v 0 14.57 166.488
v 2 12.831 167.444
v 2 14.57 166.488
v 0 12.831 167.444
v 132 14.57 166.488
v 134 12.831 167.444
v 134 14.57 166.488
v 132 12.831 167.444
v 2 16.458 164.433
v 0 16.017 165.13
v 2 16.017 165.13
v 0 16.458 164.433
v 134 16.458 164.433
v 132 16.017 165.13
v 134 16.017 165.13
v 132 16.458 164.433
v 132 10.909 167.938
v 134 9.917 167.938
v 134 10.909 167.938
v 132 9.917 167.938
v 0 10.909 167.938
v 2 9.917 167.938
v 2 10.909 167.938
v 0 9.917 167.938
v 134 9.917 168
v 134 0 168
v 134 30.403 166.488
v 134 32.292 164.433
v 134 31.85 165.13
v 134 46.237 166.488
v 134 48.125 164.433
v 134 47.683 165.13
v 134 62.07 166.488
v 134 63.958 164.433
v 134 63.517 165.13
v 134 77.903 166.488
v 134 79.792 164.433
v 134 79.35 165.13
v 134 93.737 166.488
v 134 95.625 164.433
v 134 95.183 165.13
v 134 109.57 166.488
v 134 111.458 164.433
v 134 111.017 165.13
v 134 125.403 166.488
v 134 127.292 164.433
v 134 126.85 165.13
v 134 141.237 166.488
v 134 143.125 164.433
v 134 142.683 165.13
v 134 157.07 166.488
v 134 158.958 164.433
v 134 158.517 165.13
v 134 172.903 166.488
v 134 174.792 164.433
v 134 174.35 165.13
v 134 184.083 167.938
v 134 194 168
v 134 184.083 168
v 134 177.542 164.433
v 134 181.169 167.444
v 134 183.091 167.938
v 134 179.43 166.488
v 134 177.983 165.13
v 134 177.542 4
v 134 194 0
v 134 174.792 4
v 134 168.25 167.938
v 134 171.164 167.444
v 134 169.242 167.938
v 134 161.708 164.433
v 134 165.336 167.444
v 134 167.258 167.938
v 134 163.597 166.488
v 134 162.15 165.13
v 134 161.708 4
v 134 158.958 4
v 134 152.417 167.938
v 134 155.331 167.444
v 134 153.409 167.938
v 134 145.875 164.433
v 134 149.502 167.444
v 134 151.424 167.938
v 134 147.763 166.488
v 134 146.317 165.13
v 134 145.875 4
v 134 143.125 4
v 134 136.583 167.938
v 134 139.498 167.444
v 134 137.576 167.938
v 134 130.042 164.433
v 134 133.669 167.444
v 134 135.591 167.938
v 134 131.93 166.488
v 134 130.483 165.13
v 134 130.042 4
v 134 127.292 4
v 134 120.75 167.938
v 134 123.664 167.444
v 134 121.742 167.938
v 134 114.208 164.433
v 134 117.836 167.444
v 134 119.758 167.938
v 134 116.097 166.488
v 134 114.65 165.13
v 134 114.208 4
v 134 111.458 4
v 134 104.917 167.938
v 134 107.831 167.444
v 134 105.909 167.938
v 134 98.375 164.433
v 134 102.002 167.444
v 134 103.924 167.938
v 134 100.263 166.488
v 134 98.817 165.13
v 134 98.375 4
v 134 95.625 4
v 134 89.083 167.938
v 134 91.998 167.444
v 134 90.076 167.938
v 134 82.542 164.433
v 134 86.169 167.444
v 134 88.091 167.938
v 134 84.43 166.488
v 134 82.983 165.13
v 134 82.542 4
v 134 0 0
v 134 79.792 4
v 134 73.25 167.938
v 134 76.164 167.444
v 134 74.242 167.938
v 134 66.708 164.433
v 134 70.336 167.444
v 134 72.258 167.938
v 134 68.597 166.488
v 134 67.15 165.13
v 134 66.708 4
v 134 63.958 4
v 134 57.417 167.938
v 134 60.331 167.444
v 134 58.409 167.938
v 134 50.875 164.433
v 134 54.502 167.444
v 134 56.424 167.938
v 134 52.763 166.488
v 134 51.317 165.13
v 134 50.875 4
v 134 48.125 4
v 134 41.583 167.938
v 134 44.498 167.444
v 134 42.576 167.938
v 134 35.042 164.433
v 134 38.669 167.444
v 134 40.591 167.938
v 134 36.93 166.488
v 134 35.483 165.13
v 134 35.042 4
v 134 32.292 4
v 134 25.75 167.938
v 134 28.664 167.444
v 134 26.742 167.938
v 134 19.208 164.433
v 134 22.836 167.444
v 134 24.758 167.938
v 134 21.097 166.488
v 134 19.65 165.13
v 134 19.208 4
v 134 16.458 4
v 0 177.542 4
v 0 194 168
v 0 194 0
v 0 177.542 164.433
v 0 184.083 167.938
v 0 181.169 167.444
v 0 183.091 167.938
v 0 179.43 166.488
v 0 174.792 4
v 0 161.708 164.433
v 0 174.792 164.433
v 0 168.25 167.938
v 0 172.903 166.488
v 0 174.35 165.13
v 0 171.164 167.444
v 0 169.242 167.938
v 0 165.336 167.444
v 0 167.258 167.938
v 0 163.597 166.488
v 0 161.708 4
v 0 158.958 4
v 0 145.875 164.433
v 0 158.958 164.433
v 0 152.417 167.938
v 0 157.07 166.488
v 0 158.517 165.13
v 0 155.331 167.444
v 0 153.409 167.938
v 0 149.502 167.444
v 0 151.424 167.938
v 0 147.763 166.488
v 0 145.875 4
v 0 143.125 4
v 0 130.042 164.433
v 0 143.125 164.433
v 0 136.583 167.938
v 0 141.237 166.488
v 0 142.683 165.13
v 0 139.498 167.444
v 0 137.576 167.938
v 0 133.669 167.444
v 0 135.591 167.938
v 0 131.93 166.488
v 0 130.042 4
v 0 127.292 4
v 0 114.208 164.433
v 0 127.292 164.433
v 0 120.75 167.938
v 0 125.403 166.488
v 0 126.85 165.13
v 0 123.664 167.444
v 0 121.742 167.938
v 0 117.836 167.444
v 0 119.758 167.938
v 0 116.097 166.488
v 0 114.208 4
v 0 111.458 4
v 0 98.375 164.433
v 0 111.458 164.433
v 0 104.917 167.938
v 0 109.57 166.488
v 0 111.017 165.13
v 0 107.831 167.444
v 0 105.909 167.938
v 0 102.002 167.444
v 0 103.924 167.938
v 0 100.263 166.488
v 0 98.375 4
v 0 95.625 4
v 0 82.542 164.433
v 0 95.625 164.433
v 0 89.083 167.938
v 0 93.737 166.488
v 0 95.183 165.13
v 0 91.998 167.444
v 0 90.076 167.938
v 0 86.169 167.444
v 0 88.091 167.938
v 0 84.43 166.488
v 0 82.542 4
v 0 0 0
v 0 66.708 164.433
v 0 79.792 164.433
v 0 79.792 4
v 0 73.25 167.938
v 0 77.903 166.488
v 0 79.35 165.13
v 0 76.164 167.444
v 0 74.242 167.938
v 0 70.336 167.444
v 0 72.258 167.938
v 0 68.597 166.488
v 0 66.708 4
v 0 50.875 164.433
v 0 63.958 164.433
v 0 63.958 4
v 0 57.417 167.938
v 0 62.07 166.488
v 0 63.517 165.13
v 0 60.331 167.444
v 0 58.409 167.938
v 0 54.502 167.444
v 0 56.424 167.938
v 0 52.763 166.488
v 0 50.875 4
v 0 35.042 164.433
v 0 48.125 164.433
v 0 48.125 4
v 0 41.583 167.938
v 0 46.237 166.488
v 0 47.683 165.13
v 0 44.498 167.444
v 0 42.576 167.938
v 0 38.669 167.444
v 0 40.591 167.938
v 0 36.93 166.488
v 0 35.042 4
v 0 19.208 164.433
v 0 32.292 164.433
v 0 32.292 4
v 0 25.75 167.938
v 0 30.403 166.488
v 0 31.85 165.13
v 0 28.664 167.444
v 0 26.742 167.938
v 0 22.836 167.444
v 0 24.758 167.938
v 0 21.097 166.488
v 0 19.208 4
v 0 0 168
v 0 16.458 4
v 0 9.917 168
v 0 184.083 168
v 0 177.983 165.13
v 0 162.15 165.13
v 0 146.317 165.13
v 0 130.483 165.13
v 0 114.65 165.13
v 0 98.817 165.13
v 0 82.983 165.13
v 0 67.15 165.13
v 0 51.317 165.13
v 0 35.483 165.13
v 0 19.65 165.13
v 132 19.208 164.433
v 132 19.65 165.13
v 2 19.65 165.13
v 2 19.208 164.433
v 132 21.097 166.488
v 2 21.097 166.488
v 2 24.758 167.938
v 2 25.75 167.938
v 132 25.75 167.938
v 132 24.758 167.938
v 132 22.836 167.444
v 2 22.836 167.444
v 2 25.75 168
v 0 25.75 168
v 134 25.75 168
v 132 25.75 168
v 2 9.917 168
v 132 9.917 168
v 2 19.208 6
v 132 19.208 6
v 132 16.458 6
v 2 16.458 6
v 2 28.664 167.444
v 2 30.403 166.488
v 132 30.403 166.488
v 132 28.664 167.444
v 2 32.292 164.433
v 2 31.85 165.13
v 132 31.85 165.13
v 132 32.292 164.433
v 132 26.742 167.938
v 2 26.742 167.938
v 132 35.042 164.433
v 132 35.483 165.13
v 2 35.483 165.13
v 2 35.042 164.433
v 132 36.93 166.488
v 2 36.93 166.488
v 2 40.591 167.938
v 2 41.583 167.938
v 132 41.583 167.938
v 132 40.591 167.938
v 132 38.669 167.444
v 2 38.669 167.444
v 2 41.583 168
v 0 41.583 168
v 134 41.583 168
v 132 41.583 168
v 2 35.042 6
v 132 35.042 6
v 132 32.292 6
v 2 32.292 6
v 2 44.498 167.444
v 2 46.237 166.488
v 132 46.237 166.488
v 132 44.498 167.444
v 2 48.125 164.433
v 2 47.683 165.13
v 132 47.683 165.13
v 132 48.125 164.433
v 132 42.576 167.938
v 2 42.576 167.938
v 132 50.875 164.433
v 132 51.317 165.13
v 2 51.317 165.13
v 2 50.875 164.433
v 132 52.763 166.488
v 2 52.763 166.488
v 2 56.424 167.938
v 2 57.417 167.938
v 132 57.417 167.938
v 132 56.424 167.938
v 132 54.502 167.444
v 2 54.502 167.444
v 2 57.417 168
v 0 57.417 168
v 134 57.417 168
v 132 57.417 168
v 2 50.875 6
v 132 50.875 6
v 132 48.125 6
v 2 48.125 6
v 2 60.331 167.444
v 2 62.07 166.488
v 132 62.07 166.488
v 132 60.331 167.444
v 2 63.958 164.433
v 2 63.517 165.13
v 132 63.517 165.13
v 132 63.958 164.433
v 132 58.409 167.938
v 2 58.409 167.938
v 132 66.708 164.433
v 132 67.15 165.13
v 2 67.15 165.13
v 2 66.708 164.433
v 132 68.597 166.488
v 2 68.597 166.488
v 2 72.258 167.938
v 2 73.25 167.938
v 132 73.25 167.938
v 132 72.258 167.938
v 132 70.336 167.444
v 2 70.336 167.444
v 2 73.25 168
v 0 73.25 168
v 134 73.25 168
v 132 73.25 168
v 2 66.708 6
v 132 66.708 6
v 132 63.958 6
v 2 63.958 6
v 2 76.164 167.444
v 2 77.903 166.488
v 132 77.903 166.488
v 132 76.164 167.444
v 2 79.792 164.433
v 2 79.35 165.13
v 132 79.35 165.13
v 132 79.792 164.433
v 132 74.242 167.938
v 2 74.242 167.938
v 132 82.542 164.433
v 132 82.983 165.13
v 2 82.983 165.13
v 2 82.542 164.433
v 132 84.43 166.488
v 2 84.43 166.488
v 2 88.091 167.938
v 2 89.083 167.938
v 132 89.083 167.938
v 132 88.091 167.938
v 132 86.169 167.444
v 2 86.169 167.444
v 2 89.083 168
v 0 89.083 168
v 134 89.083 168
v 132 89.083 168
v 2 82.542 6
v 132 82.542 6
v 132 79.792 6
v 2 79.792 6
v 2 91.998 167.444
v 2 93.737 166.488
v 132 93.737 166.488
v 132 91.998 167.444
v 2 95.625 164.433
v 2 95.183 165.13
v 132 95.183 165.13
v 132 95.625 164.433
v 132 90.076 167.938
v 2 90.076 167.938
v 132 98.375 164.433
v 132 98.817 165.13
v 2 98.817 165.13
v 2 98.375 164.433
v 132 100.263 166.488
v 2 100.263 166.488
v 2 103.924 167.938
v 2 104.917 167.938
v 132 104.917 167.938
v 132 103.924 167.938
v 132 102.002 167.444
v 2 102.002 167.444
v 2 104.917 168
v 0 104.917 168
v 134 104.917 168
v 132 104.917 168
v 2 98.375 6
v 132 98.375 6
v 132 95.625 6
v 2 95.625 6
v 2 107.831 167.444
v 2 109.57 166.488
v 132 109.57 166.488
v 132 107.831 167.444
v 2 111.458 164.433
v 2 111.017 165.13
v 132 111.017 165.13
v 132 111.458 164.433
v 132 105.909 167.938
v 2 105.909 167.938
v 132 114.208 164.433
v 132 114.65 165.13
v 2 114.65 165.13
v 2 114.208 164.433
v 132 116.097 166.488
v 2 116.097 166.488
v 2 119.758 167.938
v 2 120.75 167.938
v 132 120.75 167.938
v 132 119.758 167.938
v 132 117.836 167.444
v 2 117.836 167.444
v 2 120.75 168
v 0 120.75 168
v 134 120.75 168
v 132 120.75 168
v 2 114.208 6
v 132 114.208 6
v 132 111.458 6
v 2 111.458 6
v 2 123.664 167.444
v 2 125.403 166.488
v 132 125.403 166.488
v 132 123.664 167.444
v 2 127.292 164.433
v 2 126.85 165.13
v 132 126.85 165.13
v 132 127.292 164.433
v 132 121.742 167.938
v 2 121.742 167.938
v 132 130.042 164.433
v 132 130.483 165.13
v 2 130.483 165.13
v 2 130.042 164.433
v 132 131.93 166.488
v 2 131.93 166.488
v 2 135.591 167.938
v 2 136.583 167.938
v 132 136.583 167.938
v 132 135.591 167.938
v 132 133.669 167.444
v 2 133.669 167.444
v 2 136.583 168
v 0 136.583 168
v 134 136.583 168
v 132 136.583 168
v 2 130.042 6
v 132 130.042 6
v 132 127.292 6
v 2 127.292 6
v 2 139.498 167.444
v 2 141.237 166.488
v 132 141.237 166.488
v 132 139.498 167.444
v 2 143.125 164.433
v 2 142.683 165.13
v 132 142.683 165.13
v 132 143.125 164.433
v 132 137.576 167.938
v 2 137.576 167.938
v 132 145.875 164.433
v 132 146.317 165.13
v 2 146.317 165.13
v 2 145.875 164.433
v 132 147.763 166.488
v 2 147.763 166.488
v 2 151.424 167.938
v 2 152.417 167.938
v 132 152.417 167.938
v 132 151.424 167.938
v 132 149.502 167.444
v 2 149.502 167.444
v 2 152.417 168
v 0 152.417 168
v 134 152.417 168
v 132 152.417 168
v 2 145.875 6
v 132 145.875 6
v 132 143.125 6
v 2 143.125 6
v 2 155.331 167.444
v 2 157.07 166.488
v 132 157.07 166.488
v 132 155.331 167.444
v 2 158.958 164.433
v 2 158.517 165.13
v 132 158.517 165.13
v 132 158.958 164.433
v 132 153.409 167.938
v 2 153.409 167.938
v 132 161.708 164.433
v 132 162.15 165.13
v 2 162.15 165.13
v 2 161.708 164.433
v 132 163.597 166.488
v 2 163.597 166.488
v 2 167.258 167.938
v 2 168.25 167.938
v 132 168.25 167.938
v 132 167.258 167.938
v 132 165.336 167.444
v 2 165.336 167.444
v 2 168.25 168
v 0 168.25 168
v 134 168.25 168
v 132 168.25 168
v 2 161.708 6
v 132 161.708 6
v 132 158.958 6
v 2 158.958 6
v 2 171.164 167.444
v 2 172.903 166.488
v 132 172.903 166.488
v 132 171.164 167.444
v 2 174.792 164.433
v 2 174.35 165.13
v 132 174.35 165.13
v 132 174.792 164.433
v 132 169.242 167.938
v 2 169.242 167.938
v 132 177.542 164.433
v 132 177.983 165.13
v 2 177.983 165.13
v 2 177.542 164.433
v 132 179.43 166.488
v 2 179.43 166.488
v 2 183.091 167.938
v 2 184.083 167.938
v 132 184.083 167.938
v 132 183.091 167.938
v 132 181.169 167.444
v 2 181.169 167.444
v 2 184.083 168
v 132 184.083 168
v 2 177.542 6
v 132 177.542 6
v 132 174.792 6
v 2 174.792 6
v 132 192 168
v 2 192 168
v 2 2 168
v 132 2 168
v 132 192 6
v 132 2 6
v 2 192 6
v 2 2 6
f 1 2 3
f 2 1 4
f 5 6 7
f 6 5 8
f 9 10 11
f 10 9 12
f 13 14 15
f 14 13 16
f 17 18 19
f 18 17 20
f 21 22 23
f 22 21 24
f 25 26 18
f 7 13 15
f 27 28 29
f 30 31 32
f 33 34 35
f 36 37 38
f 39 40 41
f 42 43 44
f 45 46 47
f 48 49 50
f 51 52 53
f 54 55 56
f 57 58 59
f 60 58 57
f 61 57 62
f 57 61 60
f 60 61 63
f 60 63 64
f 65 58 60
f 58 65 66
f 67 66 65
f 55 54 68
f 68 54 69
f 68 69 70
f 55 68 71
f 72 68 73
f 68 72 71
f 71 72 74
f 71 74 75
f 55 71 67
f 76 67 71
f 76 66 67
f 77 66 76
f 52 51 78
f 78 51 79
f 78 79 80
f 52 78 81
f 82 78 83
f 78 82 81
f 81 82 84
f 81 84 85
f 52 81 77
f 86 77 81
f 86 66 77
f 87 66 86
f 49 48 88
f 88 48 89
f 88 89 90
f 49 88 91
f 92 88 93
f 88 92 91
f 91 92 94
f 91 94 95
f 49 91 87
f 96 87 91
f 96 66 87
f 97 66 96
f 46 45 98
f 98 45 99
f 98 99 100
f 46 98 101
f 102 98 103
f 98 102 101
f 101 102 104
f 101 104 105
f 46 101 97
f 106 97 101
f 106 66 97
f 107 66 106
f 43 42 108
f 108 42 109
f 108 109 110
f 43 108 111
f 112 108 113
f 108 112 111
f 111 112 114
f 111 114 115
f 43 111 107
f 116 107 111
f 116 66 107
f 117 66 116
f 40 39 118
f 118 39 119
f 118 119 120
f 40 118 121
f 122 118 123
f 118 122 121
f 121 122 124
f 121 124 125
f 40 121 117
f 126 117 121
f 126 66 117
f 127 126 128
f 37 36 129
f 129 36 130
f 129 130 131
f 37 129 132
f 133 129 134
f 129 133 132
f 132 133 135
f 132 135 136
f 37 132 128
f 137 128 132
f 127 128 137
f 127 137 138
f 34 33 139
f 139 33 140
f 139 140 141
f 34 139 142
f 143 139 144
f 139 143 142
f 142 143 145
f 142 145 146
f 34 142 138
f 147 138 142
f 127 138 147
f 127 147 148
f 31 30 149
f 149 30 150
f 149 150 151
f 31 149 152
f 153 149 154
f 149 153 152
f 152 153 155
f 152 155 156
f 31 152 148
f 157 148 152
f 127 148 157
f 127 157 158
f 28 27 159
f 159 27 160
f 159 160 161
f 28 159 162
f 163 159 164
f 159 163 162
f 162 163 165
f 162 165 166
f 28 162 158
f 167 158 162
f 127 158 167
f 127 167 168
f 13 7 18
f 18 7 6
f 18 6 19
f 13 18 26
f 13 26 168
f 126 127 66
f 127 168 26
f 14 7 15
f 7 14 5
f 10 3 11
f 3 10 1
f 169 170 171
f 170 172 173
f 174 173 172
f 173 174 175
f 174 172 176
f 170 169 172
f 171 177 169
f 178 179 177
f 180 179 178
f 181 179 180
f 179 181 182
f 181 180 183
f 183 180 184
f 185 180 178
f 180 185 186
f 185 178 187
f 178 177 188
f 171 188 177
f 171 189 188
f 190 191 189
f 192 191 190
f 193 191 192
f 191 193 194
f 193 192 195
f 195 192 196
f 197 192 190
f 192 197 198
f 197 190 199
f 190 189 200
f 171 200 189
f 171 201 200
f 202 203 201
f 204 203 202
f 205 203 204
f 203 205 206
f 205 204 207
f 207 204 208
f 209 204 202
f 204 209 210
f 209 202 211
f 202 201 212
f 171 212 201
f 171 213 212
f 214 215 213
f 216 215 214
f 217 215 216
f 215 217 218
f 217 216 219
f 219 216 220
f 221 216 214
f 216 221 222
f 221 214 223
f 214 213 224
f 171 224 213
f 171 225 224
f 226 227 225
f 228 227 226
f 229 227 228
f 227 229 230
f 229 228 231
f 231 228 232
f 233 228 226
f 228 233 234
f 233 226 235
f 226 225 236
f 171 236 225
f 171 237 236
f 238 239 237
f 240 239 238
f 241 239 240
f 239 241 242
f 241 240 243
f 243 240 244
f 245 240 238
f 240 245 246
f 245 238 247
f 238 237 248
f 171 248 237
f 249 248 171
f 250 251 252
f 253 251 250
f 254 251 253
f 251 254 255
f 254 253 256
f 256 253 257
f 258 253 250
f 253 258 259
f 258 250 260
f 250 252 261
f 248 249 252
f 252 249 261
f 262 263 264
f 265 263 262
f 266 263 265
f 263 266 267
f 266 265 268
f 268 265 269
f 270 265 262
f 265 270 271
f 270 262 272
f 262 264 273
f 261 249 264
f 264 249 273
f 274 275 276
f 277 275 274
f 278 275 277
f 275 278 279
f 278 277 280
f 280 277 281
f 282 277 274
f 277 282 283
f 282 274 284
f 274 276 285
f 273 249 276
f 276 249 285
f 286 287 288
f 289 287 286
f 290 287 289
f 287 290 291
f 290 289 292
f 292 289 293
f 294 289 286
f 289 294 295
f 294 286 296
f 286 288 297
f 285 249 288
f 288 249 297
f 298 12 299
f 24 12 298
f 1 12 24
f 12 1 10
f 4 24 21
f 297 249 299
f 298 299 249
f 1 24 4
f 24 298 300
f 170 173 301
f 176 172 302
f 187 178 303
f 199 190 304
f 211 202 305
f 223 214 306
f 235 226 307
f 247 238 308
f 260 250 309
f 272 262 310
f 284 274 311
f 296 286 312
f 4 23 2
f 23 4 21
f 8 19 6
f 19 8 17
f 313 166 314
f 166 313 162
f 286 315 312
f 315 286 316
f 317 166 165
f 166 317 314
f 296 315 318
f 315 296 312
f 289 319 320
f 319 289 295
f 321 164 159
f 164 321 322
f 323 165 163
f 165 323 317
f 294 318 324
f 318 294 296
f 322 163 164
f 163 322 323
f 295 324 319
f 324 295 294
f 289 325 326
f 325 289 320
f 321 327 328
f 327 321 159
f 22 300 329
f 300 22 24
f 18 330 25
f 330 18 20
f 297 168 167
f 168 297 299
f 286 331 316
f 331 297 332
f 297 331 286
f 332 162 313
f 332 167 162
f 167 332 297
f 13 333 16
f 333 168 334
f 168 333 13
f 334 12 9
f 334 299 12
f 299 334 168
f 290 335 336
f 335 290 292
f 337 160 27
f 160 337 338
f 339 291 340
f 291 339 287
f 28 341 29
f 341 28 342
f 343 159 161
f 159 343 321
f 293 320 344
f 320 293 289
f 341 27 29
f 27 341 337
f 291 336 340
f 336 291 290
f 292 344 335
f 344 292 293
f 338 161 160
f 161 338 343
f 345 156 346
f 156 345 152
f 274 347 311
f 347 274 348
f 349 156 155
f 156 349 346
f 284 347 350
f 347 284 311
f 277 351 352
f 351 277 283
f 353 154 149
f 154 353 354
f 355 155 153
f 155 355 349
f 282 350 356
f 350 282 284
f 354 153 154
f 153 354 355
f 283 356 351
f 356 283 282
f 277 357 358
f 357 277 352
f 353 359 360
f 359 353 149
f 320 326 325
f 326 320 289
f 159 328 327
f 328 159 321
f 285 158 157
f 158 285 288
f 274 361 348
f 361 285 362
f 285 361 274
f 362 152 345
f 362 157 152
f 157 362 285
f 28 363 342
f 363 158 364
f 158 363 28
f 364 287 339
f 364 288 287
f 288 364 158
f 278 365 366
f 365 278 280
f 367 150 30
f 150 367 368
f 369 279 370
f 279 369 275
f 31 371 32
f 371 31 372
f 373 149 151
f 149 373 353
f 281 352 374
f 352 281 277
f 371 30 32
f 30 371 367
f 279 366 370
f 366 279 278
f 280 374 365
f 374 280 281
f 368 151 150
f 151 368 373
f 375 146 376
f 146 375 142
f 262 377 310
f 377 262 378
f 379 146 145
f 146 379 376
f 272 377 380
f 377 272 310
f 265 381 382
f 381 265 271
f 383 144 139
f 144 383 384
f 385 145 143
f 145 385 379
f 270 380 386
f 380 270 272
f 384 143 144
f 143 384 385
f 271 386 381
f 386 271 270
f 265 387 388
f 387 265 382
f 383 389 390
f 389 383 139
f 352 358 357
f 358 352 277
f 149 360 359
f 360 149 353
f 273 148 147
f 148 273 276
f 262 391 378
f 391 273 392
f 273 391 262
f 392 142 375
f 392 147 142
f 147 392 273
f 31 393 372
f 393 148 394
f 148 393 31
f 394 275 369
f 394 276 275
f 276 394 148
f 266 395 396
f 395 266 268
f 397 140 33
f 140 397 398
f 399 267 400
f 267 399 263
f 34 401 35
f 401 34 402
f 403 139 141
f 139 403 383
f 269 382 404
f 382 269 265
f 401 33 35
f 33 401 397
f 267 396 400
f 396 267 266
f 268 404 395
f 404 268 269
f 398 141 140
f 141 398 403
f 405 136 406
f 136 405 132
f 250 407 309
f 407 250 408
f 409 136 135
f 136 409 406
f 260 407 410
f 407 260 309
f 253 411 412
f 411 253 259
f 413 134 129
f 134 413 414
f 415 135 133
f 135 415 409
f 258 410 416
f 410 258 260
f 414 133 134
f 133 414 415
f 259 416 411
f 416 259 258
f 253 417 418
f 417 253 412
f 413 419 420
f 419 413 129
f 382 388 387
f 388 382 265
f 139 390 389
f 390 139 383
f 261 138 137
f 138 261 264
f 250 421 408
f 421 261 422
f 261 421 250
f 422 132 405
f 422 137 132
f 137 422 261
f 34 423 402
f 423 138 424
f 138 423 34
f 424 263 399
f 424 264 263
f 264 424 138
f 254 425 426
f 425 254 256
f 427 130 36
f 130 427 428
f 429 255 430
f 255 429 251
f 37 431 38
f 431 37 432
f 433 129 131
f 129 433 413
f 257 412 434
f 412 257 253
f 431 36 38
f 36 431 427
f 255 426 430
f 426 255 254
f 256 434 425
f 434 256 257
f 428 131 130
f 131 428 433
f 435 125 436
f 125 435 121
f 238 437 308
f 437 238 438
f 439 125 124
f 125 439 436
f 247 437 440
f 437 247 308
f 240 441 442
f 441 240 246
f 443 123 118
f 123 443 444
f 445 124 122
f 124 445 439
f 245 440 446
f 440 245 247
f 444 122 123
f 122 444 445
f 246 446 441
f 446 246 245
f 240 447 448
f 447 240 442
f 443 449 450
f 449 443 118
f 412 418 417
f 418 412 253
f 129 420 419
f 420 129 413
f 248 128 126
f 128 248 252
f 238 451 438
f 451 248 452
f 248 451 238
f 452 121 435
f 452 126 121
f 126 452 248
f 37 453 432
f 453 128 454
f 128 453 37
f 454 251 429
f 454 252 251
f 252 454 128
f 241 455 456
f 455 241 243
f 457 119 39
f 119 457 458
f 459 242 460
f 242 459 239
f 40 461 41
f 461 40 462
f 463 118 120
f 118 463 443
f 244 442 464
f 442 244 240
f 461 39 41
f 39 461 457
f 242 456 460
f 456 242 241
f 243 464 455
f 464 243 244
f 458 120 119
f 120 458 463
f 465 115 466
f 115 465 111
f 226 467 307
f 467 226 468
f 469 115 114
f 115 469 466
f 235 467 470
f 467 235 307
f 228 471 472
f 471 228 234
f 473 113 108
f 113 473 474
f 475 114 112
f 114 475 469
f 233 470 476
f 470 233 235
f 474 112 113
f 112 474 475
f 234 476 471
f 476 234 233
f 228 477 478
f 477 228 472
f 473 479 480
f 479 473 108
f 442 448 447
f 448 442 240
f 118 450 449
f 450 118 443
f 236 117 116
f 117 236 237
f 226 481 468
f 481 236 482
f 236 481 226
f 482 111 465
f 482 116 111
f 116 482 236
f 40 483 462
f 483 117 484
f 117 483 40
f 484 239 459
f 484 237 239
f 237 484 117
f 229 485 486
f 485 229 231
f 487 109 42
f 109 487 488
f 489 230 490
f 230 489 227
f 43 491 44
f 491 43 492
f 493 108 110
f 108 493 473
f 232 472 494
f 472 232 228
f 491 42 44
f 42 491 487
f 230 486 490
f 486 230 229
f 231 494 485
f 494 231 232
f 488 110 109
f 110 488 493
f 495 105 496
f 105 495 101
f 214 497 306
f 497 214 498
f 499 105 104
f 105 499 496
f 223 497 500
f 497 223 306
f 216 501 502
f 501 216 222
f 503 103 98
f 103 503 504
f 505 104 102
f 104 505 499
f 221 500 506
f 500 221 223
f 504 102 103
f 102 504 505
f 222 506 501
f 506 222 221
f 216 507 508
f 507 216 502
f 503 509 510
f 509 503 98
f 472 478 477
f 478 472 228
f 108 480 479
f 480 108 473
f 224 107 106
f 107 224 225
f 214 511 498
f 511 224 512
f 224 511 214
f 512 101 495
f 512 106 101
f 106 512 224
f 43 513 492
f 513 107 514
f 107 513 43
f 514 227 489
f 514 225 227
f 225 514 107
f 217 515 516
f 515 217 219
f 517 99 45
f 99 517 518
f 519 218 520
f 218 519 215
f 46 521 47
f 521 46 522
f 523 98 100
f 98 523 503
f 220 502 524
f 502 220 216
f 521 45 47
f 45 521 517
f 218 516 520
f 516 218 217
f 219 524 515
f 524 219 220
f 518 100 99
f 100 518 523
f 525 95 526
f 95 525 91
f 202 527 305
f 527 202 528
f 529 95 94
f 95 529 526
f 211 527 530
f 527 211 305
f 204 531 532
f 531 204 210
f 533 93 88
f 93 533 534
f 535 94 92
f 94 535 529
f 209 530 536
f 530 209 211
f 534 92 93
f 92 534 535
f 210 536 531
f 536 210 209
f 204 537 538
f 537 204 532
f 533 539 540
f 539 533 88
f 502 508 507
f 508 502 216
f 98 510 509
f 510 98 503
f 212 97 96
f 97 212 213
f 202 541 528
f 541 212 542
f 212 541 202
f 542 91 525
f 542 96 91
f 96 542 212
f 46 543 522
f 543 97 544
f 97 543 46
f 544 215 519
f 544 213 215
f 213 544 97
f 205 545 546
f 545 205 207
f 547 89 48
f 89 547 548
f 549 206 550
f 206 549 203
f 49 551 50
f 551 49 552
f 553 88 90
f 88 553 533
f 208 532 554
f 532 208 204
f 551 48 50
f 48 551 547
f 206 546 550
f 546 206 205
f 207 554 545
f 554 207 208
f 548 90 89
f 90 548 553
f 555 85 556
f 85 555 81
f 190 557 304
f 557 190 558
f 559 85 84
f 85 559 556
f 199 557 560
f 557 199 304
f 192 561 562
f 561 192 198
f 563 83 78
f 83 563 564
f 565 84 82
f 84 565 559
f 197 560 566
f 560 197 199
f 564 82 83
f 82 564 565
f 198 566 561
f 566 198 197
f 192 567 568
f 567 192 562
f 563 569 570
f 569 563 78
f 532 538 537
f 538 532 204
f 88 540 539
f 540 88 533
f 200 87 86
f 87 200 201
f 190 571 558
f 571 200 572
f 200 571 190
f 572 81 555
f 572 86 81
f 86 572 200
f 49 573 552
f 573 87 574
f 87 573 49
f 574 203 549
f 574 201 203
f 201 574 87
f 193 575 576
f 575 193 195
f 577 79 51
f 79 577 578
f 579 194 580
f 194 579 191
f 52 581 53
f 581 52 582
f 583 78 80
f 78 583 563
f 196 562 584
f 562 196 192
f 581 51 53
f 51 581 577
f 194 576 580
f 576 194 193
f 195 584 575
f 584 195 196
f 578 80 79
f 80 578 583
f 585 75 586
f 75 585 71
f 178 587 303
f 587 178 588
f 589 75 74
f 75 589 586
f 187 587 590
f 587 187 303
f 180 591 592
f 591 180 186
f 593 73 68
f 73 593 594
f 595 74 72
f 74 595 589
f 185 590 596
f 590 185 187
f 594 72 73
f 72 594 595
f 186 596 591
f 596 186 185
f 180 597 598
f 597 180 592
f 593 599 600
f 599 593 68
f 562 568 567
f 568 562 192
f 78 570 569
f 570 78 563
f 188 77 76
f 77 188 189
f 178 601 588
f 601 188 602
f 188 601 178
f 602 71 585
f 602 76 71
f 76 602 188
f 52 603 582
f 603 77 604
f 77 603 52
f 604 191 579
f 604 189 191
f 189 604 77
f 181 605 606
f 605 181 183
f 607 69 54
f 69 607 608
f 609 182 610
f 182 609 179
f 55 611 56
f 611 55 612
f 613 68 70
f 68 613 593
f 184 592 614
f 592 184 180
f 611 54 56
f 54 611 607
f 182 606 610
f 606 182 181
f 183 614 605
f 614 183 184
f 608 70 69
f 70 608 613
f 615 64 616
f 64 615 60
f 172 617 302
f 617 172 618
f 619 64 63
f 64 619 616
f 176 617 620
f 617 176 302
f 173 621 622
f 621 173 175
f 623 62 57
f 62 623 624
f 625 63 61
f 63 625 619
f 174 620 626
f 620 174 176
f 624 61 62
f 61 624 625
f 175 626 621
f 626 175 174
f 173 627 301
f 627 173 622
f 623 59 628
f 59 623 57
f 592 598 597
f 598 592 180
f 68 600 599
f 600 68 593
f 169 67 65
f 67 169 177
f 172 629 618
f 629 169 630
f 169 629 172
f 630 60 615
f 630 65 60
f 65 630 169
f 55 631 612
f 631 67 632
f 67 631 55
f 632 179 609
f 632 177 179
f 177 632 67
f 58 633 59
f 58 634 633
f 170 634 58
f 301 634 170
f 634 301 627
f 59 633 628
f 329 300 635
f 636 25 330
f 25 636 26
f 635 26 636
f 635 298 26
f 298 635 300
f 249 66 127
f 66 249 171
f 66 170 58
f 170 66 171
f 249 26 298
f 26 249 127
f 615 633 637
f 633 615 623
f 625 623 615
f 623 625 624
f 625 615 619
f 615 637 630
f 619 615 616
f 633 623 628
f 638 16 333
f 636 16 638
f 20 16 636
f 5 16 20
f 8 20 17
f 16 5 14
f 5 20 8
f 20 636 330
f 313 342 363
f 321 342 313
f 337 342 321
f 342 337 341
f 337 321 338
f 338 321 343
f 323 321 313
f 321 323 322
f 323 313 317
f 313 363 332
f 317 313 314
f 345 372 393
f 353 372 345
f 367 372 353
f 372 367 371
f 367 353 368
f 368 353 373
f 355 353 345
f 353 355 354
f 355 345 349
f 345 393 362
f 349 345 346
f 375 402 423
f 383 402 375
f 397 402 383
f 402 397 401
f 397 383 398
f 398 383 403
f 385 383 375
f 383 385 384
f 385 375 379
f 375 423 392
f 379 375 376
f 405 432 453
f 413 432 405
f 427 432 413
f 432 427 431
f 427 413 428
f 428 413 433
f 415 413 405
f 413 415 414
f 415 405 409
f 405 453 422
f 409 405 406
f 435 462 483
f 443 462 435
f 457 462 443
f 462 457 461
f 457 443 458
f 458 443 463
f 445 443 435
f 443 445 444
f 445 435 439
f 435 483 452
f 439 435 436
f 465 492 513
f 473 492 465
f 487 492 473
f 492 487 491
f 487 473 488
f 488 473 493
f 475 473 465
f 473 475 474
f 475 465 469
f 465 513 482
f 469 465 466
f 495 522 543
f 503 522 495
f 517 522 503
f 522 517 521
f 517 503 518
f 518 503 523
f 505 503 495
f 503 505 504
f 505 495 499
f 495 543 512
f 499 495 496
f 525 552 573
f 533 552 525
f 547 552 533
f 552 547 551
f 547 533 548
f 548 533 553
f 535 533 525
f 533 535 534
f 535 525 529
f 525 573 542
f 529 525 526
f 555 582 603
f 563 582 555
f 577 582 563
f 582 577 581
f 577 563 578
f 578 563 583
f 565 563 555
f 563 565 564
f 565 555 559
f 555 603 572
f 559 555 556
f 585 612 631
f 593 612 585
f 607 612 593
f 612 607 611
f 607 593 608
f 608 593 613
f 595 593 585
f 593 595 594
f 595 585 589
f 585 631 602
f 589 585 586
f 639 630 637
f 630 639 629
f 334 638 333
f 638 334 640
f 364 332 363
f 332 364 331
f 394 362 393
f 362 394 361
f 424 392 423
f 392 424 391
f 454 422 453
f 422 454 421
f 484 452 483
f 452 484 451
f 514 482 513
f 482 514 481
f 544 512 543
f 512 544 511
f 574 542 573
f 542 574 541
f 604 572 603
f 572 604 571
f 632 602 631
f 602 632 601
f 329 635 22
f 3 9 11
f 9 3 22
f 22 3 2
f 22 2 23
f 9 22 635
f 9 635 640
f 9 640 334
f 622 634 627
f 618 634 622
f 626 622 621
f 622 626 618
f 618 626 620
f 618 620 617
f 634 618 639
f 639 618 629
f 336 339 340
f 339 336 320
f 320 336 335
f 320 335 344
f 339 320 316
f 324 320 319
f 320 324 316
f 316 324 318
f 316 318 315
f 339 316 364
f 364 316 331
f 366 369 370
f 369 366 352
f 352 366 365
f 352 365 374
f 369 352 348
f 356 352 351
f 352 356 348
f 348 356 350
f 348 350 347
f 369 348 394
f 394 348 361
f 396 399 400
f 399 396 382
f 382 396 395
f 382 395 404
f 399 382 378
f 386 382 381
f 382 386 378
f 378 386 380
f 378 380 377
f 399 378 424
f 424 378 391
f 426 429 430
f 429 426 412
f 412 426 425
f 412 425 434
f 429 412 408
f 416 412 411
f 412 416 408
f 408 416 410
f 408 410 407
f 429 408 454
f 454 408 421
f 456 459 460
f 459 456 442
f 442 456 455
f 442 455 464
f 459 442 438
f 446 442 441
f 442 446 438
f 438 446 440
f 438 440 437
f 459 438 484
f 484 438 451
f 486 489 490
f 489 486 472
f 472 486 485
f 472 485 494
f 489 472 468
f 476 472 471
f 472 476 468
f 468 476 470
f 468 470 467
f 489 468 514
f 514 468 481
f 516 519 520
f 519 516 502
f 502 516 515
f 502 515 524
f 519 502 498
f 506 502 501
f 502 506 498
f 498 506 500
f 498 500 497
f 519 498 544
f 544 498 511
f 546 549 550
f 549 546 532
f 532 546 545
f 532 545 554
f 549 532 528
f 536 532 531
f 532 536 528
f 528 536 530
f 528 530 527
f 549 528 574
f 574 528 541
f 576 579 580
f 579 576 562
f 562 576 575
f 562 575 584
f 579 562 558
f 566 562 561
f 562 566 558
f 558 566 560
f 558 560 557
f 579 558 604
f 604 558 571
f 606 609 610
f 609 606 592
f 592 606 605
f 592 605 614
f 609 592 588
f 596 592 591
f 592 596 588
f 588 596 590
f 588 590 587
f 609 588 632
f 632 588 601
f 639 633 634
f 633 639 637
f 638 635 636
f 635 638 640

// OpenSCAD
$length=190;
$width=130;
$height=160;

$bladewidth=2.75;

$slices=12;

$guidewidth=2;

$slicewidth=$length/$slices;
$radius=$slicewidth/2;

module guide(){
    translate([0,-$bladewidth/2,$guidewidth*2]){
        cube([$width+2*$guidewidth,$bladewidth,$height+2*$guidewidth]);
    }
    translate([0,-$radius,$height+4*$guidewidth-$radius]){
        difference(){
            cube([$width+2*$guidewidth,$radius*2,$radius+1]);
            rotate([0,90,0]){
                cylinder(r=$radius,h=$width+2*$guidewidth);
                translate([0,2*$radius,0]){
                    cylinder(r=$radius,h=$width+2*$guidewidth);
                }
            }
        }
    }
    
}

difference(){
    cube([$width+2*$guidewidth,$length+2*$guidewidth,$height+4*$guidewidth]);
    translate([$guidewidth,$guidewidth,3*$guidewidth]){
        cube([$width,$length,$height+2*$guidewidth]);
    }
    for(slice=[1:1:$slices-1]){
        translate([0,$guidewidth+slice*$slicewidth,0]) {
            guide();
        }
    }
}
